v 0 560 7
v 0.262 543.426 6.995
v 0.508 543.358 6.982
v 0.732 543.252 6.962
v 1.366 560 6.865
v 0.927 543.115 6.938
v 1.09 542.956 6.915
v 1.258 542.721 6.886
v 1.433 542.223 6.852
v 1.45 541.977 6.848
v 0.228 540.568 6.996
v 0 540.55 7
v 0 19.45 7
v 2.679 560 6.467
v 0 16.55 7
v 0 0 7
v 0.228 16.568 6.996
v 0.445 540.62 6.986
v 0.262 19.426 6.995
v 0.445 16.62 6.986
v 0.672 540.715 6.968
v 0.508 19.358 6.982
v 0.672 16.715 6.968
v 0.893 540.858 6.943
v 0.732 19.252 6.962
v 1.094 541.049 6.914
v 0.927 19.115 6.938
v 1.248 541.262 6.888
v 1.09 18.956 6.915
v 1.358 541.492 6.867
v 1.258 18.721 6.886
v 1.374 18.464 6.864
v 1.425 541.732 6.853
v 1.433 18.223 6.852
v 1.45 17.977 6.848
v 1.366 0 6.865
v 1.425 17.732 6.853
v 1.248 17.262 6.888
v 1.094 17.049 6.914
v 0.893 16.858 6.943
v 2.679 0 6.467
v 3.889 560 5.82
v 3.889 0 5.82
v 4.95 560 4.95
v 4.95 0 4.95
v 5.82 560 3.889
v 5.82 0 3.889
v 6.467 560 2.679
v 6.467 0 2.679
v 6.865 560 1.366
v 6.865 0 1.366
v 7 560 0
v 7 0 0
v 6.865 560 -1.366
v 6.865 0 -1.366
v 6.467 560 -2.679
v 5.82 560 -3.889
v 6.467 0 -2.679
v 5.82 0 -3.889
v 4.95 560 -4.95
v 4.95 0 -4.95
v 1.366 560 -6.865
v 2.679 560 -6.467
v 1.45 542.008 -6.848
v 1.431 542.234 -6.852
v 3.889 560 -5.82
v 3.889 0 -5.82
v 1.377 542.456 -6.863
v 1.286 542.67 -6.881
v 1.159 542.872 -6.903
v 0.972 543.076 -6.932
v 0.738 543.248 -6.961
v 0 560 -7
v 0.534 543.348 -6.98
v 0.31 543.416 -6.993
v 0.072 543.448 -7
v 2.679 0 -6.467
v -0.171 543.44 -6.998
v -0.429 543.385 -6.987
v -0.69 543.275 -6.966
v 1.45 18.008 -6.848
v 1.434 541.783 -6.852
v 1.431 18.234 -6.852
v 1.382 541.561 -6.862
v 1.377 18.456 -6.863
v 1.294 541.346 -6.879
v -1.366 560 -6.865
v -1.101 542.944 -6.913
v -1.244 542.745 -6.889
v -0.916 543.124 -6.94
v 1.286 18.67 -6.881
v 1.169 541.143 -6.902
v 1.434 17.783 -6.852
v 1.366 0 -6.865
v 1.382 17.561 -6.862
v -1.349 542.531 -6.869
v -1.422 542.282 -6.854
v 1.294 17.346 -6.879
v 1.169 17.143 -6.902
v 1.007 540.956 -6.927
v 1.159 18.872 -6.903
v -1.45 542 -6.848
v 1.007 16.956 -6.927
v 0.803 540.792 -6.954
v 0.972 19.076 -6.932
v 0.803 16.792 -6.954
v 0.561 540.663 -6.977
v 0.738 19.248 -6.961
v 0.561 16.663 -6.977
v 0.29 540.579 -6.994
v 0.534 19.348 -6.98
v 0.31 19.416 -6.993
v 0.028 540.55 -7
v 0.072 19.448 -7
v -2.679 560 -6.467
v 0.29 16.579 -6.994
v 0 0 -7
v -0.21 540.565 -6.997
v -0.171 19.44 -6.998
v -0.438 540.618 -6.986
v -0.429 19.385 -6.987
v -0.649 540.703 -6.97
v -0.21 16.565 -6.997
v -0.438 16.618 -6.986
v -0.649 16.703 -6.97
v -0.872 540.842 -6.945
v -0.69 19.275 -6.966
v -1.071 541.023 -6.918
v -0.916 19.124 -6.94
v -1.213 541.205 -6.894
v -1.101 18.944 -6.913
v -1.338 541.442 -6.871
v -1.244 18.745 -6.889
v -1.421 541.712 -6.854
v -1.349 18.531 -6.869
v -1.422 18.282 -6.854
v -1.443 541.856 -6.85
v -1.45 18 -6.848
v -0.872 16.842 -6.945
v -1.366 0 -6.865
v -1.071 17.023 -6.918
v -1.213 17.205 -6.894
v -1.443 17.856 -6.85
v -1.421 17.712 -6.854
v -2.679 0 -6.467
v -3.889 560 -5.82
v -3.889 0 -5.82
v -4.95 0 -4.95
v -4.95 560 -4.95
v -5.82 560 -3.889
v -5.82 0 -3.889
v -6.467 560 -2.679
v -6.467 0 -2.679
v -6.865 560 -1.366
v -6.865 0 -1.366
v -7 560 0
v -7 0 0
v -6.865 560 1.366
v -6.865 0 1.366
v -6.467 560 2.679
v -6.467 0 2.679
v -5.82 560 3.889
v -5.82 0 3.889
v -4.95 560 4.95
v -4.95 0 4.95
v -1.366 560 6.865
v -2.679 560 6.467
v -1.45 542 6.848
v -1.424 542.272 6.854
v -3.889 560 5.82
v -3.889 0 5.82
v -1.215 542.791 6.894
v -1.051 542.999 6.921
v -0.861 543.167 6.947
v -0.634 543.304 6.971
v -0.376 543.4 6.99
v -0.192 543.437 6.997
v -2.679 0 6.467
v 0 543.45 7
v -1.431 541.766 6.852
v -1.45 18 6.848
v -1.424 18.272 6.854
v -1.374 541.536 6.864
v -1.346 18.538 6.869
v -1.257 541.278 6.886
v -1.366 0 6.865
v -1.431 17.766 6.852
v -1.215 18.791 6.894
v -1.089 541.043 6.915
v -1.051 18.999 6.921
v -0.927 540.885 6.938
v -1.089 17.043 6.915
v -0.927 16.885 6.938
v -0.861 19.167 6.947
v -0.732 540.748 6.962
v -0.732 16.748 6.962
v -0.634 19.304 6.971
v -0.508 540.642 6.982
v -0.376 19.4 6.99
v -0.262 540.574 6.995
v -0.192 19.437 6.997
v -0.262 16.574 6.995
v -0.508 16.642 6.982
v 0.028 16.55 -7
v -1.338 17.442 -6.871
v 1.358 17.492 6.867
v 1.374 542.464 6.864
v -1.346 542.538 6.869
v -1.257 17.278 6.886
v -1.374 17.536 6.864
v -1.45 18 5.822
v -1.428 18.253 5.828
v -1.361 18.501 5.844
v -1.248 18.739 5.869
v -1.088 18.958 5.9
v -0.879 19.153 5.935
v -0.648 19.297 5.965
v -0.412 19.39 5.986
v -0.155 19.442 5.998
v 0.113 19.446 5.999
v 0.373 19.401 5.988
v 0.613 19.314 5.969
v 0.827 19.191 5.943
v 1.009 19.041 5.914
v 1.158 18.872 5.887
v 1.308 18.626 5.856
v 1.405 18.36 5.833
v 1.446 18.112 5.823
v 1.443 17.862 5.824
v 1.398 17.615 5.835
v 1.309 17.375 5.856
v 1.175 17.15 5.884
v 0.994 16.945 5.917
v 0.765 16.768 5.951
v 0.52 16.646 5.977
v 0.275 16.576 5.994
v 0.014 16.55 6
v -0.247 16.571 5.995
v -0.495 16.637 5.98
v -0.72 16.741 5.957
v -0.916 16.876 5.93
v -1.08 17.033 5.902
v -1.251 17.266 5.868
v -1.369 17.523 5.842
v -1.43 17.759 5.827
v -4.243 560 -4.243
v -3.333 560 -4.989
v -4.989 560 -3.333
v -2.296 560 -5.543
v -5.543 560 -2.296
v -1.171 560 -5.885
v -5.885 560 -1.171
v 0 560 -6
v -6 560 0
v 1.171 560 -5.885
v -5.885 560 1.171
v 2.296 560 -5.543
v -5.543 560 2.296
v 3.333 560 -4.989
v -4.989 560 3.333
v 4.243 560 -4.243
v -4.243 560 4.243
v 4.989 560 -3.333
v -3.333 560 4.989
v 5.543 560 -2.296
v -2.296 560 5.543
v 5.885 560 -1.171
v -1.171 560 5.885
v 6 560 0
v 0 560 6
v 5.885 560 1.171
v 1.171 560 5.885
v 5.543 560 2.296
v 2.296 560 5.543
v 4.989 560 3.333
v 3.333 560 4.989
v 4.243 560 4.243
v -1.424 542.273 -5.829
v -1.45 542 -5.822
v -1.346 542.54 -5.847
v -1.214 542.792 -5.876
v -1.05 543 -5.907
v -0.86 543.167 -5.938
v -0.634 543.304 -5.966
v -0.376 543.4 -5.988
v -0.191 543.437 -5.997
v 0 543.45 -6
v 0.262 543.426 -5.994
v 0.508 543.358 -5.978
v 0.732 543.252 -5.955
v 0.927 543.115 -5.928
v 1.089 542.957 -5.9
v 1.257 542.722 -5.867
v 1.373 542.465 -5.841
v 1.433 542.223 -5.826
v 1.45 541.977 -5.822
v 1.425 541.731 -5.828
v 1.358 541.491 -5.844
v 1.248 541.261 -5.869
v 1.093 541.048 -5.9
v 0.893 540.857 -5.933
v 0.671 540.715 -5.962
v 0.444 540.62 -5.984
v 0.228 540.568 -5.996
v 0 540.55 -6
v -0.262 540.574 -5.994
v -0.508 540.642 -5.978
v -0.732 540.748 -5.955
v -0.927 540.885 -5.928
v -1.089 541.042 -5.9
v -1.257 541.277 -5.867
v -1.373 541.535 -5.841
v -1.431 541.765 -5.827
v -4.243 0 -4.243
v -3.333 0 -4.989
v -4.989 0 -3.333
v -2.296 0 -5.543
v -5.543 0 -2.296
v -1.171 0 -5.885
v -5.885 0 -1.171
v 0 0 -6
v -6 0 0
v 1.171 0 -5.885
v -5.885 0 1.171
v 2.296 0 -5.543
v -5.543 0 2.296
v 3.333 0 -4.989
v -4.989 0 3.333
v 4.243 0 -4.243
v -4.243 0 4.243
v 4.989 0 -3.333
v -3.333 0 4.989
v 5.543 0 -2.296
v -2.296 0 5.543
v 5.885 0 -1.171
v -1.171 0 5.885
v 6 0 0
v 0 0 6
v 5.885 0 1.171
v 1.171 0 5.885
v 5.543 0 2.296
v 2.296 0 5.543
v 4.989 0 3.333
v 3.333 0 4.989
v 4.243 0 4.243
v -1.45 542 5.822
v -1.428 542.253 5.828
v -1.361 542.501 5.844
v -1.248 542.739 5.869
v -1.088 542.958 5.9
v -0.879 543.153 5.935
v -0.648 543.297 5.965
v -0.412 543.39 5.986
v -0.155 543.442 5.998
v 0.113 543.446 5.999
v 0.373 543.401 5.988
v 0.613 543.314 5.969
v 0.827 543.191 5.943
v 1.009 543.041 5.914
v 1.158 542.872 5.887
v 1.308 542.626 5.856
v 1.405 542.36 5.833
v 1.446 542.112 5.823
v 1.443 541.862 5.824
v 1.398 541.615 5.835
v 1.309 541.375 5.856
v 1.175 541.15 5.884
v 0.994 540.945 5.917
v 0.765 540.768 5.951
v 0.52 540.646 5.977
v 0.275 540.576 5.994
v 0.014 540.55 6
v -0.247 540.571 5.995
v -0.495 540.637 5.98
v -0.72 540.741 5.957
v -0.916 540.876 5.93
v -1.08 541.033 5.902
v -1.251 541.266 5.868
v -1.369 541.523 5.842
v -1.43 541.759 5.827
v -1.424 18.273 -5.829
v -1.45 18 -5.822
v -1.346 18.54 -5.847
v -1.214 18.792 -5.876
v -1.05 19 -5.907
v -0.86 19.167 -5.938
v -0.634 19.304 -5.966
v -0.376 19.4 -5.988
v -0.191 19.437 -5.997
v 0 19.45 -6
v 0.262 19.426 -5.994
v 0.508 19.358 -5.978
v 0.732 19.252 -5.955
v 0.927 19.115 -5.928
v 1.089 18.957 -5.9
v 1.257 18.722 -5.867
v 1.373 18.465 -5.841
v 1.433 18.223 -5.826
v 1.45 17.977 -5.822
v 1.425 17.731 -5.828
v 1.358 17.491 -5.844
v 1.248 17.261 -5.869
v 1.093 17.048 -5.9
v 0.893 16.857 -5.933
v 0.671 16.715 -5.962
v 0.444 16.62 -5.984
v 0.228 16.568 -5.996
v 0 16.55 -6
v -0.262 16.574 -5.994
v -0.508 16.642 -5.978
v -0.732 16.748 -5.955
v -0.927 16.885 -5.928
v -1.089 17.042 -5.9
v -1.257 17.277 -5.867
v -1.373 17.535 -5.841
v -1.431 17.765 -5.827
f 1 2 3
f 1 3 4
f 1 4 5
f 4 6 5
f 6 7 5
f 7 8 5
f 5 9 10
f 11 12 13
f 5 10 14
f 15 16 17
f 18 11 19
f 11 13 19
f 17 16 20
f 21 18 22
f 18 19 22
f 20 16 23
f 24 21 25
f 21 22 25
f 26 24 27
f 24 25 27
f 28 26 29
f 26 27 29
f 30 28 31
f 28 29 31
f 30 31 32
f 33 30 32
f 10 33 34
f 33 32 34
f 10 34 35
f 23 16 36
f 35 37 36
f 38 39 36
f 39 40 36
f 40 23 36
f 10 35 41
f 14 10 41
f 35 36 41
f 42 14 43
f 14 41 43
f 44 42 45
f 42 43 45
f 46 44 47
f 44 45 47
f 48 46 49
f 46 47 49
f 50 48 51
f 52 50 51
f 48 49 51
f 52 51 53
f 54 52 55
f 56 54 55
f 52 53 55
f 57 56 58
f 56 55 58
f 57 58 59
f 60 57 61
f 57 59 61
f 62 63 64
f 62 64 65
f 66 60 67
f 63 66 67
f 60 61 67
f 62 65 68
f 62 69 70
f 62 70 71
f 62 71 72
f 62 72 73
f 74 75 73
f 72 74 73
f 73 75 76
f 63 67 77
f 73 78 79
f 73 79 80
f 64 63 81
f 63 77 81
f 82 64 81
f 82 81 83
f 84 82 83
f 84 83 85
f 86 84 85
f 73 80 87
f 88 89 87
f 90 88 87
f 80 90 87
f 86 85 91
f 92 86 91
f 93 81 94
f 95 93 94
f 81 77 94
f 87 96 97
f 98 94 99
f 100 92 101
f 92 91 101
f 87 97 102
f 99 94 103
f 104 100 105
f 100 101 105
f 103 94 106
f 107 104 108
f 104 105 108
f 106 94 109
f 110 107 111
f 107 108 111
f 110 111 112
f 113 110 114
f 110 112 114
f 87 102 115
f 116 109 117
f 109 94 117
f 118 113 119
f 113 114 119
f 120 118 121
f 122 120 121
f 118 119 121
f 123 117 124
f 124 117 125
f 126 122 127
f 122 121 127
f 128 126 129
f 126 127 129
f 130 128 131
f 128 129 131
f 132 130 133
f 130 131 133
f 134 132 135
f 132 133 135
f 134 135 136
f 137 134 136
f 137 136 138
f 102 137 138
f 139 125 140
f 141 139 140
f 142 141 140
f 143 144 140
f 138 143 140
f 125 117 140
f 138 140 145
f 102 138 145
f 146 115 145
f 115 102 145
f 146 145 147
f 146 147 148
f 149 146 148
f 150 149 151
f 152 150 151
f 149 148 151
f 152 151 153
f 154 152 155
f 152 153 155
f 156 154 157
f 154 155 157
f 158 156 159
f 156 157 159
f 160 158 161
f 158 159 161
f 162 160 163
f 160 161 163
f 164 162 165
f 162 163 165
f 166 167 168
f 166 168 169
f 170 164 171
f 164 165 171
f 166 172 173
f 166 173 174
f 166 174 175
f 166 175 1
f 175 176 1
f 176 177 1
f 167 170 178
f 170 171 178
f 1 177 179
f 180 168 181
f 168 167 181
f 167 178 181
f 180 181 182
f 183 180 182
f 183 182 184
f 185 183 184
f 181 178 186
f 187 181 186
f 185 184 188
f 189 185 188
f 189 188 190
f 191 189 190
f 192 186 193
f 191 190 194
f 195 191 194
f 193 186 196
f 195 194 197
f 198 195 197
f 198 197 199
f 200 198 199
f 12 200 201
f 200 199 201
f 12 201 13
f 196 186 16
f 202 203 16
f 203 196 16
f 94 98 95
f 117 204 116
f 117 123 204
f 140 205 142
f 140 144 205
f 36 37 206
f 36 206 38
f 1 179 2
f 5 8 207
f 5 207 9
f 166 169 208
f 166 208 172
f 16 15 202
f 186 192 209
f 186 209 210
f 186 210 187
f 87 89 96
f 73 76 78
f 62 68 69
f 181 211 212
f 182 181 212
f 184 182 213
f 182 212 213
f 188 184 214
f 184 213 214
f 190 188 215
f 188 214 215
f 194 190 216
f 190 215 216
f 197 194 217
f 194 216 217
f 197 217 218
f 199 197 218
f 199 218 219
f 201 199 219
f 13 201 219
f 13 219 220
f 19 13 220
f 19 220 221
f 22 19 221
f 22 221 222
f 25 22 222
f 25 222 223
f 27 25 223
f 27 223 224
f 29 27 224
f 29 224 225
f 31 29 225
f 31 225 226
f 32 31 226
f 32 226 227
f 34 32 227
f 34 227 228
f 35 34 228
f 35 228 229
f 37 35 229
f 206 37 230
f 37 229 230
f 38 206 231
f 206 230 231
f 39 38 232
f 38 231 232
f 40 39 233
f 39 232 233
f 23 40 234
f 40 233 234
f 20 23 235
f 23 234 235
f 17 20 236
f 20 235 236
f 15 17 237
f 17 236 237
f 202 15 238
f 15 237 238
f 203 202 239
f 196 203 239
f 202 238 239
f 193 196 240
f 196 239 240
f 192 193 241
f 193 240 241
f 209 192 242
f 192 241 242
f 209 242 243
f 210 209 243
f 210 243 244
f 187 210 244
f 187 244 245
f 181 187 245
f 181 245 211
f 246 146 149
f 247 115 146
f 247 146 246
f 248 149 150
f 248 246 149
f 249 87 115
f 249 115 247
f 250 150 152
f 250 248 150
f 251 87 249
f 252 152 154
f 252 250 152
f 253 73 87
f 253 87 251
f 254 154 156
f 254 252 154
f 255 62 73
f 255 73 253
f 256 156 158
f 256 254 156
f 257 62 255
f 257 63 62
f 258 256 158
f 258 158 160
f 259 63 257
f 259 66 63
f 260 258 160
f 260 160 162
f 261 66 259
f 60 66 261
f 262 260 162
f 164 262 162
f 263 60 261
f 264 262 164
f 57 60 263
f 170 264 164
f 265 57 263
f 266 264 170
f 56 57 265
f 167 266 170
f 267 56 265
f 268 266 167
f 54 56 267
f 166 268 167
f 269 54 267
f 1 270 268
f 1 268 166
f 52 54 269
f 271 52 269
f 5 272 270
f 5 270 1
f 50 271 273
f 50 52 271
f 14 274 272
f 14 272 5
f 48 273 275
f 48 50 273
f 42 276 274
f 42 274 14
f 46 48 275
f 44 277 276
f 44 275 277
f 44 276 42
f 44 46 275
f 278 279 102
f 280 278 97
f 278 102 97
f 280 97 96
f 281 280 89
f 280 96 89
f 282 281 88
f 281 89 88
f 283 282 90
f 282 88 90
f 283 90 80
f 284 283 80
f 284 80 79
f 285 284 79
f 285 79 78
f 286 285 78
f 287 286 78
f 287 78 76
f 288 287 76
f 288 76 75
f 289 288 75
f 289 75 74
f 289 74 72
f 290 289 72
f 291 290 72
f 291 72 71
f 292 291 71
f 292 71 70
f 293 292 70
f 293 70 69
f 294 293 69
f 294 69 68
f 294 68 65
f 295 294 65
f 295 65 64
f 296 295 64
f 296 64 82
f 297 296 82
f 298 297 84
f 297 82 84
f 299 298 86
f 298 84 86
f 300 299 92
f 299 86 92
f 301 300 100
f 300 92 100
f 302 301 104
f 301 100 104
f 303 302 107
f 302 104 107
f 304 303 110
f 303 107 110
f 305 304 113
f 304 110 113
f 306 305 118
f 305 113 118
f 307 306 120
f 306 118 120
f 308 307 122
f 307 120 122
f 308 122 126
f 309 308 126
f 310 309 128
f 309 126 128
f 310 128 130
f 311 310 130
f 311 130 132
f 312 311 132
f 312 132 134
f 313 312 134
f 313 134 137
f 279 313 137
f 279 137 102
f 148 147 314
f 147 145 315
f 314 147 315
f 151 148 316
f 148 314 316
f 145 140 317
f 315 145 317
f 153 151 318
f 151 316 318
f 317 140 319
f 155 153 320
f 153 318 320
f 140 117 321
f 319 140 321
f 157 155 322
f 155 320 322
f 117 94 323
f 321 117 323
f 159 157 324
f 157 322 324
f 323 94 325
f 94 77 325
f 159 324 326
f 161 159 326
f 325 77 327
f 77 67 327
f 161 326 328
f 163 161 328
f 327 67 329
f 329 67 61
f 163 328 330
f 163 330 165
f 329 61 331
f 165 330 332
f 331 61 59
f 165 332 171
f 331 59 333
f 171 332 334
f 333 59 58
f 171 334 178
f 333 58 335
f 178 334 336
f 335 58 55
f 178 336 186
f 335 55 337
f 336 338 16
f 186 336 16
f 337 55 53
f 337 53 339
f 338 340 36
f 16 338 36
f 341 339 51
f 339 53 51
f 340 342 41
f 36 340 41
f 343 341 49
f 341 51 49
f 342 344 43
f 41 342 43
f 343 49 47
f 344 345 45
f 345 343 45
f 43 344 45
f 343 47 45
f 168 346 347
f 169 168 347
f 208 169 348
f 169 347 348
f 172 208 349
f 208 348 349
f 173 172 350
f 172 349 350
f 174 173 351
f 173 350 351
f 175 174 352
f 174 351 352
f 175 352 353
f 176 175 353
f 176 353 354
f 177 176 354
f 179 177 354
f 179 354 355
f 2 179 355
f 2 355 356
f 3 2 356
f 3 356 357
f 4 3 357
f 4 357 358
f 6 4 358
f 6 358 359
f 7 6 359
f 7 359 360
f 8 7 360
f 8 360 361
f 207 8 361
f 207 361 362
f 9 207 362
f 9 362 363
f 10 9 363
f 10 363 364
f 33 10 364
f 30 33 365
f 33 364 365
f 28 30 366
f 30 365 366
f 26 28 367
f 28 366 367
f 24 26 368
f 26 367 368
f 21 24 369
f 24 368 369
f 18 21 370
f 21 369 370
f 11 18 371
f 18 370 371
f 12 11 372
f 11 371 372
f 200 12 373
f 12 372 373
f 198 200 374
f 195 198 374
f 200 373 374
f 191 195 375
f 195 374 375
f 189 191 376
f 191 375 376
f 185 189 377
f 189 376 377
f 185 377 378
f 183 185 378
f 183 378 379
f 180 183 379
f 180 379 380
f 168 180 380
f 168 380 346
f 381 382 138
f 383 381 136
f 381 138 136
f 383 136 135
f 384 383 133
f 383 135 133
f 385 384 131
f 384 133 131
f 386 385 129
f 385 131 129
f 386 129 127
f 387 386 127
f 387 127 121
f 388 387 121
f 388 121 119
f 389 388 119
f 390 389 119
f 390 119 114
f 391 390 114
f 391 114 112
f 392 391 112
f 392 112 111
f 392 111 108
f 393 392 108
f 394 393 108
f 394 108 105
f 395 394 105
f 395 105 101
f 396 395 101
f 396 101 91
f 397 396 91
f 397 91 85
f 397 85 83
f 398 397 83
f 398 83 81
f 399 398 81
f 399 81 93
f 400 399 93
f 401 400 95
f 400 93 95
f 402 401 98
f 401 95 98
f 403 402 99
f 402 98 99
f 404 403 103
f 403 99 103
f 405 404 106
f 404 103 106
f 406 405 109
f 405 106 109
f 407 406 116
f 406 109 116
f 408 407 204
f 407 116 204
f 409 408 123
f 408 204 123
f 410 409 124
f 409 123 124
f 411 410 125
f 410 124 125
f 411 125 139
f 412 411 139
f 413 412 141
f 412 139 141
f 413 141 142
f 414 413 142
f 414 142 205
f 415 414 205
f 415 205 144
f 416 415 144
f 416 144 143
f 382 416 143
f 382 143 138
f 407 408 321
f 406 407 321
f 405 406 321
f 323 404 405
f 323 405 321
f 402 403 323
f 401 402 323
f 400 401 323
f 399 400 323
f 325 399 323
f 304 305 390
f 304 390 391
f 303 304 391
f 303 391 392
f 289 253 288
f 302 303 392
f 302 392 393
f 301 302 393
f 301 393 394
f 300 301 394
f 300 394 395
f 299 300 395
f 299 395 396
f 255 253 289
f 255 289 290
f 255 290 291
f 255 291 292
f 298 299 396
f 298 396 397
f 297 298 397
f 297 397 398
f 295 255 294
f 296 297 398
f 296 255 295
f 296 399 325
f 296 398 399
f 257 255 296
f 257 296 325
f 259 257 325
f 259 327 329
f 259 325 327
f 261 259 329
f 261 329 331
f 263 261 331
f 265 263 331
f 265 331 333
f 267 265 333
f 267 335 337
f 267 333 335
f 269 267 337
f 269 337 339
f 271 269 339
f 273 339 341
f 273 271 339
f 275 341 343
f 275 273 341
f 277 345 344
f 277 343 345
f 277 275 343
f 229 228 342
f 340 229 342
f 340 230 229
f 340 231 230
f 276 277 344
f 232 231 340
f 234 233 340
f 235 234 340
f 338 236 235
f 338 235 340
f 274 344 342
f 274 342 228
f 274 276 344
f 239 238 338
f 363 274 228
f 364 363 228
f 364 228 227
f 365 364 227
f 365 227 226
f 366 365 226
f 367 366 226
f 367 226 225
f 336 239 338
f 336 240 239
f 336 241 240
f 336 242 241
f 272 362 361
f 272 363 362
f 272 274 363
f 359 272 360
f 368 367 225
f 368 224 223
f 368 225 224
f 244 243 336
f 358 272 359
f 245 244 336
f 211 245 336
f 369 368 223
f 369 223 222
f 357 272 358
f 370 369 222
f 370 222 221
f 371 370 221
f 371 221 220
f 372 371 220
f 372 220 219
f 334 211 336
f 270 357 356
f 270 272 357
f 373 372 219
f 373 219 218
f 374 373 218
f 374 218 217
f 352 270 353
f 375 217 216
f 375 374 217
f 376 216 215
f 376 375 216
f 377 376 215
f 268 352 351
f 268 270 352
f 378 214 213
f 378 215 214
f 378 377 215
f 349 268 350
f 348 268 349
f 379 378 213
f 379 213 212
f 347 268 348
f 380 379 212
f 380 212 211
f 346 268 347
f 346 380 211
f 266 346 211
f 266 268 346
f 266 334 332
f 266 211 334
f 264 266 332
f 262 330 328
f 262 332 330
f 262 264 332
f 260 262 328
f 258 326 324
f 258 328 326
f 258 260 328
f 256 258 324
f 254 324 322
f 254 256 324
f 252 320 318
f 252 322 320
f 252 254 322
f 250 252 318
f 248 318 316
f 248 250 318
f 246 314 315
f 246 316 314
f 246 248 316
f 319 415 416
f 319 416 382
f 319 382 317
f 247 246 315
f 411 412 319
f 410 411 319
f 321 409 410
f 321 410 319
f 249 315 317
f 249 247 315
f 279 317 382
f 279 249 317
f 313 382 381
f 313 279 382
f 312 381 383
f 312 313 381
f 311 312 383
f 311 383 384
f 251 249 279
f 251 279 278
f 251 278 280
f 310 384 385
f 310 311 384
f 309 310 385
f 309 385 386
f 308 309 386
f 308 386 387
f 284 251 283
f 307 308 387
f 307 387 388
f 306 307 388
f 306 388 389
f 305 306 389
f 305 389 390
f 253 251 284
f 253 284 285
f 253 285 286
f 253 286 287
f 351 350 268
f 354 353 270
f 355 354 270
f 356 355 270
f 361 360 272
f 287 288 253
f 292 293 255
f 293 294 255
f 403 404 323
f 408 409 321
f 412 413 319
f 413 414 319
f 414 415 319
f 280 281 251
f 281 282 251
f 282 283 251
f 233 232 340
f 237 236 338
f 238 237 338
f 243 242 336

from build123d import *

# Parameters (mm, degrees)
SKETCH_1_R               = 7
EXTRUDE_1_DEPTH          = 560
CUT_EXTRUDE_1_DEPTH      = 561.087493165
CUT_EXTRUDE_1_DEPTH_BACK = 561.087493165
SKETCH_2_R               = 6
HOLE_WIZARD_M2_5_1_D     = 2.9


with BuildPart() as part:
    # 스케치1 → 보스-돌출1 (new body)
    with BuildSketch(Plane(origin=(0, 0, 0), x_dir=(1, 0, 0), z_dir=(0, 1, 0))):
        with Locations(Location((0, 0, 0), (0, 0, 270))):
            Circle(SKETCH_1_R)
    extrude(amount=EXTRUDE_1_DEPTH)

    # 스케치2 → 컷-돌출1 (cut, two sides: drawn at the far end of the back side and taken through both)
    with BuildSketch(Plane.XZ.offset(-CUT_EXTRUDE_1_DEPTH_BACK)):
        with Locations(Location((0, 0, 0), (0, 0, 270))):
            Circle(SKETCH_2_R)
    extrude(amount=CUT_EXTRUDE_1_DEPTH + CUT_EXTRUDE_1_DEPTH_BACK, mode=Mode.SUBTRACT)

    # M2.5 여유 구멍1 (through all)
    with Locations(Plane.XY.offset(7)):
        with Locations((0, 18), (0, 542)):
            Hole(HOLE_WIZARD_M2_5_1_D / 2)


solid = part.part
